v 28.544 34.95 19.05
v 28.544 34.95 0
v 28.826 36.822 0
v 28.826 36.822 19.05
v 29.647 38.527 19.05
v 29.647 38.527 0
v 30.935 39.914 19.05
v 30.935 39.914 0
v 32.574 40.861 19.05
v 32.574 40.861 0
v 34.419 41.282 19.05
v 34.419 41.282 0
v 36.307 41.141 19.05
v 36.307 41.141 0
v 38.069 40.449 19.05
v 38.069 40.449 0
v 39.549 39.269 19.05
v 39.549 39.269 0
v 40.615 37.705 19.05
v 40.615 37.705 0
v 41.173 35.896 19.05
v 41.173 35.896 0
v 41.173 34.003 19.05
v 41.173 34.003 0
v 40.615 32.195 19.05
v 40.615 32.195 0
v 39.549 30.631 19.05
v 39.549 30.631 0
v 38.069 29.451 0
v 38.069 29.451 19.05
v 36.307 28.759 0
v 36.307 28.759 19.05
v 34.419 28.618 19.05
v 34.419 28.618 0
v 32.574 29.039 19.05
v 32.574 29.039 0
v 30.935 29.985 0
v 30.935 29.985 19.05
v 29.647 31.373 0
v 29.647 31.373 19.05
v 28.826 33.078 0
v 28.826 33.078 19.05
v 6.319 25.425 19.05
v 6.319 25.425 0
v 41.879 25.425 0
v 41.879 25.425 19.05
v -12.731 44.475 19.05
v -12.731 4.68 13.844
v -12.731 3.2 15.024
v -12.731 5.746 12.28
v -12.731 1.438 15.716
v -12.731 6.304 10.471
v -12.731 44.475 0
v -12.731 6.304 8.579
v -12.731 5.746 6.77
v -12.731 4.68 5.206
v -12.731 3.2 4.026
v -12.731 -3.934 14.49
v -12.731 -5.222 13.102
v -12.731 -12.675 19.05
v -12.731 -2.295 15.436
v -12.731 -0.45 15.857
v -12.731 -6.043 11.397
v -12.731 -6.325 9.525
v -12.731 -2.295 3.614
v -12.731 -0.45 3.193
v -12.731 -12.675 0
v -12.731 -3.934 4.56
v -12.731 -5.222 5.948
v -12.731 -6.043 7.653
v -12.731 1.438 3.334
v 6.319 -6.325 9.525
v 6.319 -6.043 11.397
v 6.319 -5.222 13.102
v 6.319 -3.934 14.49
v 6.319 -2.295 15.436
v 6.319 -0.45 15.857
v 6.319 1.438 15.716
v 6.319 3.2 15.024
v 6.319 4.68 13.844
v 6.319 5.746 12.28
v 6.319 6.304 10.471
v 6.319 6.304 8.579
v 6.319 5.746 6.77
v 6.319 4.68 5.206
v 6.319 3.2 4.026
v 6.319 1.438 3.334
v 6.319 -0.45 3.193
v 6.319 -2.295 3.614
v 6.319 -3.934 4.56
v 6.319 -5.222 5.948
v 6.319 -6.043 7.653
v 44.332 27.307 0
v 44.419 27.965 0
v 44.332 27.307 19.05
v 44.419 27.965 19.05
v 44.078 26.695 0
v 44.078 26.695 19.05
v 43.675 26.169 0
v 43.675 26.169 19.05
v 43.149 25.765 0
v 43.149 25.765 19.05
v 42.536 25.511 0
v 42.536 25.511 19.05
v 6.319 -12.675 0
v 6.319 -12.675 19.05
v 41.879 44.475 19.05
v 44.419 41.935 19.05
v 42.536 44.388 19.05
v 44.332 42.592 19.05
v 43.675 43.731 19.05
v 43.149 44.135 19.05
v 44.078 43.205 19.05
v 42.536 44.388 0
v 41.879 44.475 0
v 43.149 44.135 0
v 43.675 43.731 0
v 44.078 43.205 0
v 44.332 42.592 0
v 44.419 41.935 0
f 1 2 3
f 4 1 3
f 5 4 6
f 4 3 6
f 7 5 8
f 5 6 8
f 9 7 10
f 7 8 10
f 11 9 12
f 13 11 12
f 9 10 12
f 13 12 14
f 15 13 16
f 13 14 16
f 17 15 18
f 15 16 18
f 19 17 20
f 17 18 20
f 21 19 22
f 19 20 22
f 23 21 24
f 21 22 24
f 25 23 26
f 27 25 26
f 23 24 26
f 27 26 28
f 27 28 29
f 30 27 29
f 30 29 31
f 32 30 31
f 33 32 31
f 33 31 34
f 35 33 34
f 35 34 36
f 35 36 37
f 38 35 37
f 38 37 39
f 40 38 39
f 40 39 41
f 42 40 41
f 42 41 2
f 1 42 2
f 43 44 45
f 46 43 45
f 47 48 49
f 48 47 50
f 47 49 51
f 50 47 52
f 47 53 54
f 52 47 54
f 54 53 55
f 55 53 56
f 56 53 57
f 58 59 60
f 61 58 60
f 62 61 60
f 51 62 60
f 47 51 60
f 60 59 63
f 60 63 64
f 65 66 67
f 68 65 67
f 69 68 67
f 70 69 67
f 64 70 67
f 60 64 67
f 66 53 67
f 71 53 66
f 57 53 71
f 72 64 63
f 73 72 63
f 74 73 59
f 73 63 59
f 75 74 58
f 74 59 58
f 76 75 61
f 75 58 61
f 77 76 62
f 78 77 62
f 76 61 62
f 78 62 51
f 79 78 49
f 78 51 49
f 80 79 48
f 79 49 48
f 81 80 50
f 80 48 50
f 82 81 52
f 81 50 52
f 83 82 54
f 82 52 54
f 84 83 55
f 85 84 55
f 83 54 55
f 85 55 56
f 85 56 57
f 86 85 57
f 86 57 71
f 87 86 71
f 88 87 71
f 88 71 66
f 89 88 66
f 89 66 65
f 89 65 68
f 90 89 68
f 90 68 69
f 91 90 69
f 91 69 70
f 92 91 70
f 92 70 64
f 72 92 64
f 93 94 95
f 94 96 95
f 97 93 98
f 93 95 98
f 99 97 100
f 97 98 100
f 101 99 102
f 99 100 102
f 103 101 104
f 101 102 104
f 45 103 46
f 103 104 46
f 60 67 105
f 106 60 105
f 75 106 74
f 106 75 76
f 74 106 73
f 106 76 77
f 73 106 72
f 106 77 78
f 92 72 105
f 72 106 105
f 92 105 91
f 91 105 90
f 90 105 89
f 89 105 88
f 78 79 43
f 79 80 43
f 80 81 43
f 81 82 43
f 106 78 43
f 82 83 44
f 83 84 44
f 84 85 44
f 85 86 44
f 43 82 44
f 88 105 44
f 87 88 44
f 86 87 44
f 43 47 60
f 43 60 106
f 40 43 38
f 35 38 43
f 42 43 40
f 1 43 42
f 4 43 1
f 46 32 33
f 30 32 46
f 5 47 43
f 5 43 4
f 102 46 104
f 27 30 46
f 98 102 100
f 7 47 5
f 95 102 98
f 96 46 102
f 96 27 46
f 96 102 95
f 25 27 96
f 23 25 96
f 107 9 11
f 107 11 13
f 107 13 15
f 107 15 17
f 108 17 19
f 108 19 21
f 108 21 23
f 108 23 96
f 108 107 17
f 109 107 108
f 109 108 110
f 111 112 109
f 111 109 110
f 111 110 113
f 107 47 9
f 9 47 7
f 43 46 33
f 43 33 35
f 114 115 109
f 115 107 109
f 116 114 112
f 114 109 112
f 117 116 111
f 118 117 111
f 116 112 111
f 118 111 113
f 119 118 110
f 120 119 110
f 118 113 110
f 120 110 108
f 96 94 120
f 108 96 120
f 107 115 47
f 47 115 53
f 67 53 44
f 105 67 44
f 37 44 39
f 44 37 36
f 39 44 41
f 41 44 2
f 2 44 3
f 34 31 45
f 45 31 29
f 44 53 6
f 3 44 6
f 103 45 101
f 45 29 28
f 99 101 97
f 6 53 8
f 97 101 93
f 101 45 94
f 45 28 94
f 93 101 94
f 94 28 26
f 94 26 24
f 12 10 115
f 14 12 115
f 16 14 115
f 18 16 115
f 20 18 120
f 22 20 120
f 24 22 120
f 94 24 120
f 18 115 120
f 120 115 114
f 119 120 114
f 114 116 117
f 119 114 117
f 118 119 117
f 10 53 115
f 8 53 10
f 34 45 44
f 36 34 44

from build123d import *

# Parameters (mm, degrees)
F1_DEPTH = 19.05
F3_D     = 12.7
F4_R     = 2.54
F6_D     = 12.7


# Not quite as in the source:
# - a feature names something its author has since deleted; it is built from what else it names


with BuildPart() as f1:
    # F0 (on Top) → F1 (new body)
    with BuildSketch(Plane.XY):
        Polygon((-12.7313164792, 44.4748119943), (-12.7313164792, -12.6751880057), (6.3186835208, -12.6751880057), (6.3186835208, 25.4248119943), (44.4186835208, 25.4248119943), (44.4186835208, 44.4748119943), align=None)
    extrude(amount=F1_DEPTH)

    # F3 (through all)
    with Locations(Plane.XY.offset(19.05)):
        with Locations((34.8936835208, 34.9498119943)):
            Hole(F3_D / 2)

    # F4
    f4_edges = [f1.edges().sort_by_distance(p)[0] for p in [
        (44.418684, 25.424812, 9.525),
        (44.418684, 44.474812, 9.525),
    ]]
    fillet(f4_edges, radius=F4_R)

    # F6 (through all)
    with Locations(Plane.YZ.offset(6.3186835208)):
        with Locations((0.0248119943, 9.525)):
            Hole(F6_D / 2)


solid = f1.part
